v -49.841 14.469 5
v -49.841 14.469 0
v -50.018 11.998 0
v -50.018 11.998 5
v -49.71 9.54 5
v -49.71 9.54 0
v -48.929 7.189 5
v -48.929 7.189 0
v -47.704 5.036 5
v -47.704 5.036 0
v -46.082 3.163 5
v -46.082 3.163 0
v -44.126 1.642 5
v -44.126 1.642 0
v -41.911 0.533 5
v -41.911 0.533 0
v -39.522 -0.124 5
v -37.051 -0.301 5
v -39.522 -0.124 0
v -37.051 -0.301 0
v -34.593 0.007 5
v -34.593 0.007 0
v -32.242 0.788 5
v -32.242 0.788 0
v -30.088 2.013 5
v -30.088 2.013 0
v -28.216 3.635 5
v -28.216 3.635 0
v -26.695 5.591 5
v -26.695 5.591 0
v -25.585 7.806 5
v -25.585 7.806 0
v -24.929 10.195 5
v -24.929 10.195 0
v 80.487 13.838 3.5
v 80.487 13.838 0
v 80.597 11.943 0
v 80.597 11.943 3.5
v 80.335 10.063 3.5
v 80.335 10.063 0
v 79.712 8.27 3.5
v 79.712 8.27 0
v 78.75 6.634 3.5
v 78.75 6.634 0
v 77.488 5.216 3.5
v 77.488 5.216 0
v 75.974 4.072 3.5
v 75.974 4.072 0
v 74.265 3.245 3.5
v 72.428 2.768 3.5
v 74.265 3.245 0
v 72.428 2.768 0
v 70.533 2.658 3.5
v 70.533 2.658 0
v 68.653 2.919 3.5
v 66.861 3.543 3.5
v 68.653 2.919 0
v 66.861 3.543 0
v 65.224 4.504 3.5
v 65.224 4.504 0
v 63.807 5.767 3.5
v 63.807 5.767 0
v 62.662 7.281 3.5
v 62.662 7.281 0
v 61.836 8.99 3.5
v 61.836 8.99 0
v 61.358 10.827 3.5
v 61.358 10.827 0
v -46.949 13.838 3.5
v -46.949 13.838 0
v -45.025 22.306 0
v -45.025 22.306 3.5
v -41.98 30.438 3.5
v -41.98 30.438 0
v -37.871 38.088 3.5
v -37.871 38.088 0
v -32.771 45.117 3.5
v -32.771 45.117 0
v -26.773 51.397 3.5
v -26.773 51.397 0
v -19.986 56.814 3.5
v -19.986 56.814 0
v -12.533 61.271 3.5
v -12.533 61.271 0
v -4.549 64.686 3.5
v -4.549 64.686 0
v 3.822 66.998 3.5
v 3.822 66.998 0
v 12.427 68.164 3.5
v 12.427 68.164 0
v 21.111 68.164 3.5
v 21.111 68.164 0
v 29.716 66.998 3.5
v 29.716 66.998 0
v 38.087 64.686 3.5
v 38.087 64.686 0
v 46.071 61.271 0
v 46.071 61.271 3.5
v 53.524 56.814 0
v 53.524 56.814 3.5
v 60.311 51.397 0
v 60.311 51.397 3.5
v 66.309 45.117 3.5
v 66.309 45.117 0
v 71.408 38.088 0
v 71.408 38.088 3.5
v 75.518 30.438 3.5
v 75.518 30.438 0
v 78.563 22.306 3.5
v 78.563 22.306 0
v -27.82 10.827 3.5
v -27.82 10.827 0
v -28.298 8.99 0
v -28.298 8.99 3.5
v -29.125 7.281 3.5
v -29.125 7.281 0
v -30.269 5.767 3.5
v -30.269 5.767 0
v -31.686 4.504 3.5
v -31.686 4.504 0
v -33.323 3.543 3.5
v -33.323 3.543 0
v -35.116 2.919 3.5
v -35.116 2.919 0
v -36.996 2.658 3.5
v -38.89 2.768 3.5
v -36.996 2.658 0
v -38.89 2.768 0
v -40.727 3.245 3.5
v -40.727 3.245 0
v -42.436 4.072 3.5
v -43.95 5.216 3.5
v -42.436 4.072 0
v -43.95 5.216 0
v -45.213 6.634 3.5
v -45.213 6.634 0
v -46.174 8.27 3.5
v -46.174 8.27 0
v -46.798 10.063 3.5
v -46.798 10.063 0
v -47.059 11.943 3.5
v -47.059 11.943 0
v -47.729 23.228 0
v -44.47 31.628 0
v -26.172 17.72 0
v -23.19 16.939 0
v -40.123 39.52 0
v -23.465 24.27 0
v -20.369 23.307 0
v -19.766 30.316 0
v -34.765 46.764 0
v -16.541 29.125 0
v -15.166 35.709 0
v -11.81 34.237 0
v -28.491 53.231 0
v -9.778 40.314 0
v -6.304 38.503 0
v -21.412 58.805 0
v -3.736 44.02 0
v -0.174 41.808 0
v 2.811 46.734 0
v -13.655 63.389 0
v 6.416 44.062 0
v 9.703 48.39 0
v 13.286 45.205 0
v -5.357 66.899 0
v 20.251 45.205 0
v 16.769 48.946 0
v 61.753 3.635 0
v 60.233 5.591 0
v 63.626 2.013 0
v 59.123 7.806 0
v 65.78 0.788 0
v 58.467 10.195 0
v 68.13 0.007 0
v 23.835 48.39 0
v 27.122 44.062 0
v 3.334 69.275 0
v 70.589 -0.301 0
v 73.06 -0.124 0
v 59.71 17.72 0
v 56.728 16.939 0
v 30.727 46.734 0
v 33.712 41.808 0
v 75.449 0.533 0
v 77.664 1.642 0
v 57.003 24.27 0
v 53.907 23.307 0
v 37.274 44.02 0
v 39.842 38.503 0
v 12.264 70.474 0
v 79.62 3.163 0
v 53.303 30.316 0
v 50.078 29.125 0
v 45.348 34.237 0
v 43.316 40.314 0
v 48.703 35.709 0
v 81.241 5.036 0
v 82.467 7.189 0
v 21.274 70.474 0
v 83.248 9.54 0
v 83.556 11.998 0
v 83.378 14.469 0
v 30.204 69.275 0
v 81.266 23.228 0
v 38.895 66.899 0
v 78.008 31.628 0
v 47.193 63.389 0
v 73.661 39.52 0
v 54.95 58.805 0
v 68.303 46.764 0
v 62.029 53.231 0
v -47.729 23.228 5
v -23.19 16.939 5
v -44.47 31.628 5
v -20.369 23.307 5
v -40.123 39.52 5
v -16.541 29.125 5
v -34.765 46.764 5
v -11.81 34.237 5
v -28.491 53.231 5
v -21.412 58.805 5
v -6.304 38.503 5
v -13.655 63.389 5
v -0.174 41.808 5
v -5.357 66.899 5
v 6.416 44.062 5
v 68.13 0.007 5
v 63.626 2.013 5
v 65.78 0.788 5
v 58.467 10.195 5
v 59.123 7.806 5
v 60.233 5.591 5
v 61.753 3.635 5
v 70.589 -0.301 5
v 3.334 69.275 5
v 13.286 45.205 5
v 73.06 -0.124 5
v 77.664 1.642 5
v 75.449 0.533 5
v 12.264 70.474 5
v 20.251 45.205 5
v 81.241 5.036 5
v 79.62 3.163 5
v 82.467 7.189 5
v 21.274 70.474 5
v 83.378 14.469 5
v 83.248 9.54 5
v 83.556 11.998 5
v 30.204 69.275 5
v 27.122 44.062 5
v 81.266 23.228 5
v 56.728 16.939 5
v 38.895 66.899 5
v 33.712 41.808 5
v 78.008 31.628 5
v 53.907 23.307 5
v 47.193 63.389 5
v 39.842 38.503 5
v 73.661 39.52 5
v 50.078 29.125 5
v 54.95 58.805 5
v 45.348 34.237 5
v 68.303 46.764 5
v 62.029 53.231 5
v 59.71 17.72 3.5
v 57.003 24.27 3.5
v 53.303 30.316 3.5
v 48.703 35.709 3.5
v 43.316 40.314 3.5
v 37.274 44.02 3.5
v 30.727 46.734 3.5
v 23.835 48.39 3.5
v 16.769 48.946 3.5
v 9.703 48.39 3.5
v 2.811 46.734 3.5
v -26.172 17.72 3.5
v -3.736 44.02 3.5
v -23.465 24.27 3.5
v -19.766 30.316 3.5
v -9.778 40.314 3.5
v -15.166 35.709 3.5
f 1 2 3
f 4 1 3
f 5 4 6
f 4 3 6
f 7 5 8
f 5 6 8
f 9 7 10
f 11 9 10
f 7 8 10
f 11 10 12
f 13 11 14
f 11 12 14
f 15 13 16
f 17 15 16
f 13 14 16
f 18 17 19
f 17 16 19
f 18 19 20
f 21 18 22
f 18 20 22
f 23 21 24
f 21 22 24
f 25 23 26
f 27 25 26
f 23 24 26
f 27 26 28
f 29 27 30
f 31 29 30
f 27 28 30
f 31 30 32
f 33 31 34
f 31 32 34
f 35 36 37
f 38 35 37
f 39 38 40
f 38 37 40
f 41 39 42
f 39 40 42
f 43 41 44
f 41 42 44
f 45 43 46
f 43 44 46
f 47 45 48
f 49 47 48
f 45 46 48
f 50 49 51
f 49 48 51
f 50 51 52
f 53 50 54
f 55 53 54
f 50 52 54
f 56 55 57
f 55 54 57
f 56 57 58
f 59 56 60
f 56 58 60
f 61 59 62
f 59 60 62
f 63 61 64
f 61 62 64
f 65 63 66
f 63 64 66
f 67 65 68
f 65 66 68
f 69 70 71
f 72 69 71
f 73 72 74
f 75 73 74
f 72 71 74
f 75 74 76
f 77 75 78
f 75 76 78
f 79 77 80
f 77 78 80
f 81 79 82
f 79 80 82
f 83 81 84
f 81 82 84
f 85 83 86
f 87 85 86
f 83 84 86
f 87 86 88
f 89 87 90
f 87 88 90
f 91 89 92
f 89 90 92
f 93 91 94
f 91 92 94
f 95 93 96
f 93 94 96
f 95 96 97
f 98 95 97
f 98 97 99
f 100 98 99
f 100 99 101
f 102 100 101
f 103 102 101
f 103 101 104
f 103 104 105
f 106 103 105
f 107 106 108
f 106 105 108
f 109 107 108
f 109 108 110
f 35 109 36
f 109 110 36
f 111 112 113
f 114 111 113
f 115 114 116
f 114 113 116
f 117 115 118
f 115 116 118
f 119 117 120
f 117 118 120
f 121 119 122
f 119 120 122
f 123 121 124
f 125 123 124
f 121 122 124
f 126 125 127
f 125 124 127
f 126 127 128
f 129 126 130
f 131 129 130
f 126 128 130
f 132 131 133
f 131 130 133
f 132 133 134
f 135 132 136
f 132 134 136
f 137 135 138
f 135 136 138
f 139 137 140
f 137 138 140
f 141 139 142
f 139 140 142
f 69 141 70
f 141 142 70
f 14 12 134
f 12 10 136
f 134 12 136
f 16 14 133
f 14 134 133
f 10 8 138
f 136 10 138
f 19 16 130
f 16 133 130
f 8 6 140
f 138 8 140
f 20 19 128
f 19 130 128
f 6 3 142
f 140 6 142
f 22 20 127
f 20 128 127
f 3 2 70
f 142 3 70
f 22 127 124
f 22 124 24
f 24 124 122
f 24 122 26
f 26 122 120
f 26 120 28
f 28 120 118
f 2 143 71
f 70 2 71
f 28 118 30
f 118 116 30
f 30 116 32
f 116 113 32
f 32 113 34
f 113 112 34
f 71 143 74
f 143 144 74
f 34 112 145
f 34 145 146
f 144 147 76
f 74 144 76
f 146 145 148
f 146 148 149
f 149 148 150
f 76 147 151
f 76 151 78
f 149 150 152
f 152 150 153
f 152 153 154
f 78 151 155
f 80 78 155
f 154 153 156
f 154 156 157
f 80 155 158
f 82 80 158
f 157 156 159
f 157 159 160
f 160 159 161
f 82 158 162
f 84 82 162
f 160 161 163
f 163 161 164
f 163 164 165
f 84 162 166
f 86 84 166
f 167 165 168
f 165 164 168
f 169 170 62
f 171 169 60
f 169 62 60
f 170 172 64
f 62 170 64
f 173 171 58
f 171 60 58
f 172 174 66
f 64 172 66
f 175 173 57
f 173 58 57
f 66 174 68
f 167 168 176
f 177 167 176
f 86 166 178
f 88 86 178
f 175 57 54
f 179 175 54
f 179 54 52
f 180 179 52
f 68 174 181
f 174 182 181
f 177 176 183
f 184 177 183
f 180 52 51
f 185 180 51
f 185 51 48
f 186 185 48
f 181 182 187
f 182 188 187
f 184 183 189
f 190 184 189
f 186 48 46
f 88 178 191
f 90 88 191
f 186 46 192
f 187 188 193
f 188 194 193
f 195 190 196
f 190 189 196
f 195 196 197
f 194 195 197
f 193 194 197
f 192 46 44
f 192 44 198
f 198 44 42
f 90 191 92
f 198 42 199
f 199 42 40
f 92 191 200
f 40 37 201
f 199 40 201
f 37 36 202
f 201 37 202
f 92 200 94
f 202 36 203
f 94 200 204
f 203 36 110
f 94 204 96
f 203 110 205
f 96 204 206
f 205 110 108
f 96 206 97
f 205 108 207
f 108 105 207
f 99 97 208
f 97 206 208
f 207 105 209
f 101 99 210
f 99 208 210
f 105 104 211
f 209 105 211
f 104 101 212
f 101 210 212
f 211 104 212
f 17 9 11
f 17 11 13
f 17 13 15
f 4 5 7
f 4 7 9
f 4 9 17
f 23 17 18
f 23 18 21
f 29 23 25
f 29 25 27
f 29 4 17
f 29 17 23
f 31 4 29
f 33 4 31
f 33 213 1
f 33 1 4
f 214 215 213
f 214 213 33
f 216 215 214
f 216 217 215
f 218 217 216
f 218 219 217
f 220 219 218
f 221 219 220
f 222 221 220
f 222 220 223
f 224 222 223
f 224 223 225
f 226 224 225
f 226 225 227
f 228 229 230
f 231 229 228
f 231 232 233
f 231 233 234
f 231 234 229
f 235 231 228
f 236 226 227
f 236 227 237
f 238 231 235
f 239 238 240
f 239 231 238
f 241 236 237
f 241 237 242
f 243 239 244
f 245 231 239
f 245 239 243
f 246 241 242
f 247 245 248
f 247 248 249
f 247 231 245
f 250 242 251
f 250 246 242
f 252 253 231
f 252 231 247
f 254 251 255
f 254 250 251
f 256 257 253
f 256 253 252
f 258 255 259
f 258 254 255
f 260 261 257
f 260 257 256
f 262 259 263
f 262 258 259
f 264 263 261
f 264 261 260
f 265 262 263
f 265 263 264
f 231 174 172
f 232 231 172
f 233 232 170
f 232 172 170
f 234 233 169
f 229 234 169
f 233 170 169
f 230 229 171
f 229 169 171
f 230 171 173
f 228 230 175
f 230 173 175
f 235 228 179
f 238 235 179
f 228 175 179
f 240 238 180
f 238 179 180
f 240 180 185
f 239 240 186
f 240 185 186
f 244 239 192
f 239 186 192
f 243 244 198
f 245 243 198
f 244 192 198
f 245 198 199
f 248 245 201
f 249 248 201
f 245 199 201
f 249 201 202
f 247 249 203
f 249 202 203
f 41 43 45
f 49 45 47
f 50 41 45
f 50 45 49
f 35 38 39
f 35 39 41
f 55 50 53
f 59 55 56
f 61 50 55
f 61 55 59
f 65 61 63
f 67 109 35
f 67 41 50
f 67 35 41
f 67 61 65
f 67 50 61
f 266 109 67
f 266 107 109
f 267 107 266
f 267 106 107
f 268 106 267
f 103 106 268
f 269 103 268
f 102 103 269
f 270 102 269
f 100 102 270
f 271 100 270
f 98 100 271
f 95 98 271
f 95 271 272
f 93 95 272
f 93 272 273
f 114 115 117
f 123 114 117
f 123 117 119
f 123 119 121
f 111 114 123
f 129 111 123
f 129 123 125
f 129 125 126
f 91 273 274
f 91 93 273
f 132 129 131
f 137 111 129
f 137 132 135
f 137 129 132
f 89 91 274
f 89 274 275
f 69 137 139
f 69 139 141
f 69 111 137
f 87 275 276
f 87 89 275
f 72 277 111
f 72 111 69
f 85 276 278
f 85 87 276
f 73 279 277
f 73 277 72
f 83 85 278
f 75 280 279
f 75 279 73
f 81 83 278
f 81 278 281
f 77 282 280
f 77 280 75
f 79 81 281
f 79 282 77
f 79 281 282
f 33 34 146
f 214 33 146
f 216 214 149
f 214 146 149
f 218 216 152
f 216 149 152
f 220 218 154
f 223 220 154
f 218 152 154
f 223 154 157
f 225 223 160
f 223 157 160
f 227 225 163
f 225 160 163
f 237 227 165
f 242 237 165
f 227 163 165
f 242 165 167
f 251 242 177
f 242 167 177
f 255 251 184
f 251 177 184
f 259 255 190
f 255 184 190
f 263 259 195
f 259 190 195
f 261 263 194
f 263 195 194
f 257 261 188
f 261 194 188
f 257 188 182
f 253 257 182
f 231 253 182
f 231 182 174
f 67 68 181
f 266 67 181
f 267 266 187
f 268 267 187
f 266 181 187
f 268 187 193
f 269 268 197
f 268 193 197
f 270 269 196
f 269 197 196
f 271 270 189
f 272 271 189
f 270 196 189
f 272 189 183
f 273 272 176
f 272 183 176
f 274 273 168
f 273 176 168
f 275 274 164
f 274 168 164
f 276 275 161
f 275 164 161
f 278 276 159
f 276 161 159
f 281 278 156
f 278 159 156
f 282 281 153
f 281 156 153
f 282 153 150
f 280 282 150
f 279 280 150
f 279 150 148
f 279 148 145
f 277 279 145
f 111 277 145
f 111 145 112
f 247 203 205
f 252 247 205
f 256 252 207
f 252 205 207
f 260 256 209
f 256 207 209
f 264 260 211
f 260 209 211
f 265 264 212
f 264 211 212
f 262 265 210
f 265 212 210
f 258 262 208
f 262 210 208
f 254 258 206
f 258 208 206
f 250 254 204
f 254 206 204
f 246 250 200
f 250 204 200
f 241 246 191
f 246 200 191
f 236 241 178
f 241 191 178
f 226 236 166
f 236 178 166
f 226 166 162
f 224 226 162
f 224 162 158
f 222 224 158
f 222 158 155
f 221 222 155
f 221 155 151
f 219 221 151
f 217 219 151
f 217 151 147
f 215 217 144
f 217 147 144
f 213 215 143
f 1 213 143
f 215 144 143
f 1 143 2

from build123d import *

# Parameters (mm, degrees)
BOSS_EXTRUDE1_DEPTH = 5
CUT_EXTRUDE1_DEPTH  = 3.5


with BuildPart() as part:
    # Sketch1 → Boss-Extrude1 (new body)
    with BuildSketch(Plane.XY):
        with BuildLine():
            ThreePointArc((83.37845056, 14.469012335), (16.768892688, 70.623970918), (-49.840665185, 14.469012335))
            ThreePointArc((-49.840665185, 14.469012335), (-39.521894243, -0.123659797), (-24.929222112, 10.195111145))
            ThreePointArc((-24.929222112, 10.195111145), (16.768892688, 45.348563357), (58.467007487, 10.195111145))
            ThreePointArc((58.467007487, 10.195111145), (73.059679618, -0.123659797), (83.37845056, 14.469012335))
        make_face()
    extrude(amount=BOSS_EXTRUDE1_DEPTH)

    # Sketch2 → Cut-Extrude1 (cut)
    with BuildSketch(Plane(origin=(0, 0, 0), x_dir=(-1, 0, 0), z_dir=(0, 0, -1))):
        with BuildLine():
            ThreePointArc((46.94943865, 13.837591132), (-16.768892688, 68.310693084), (-80.487224025, 13.837591132))
            ThreePointArc((-80.487224025, 13.837591132), (-72.428258415, 2.767566738), (-61.358234021, 10.826532348))
            ThreePointArc((-61.358234021, 10.826532348), (-16.768892688, 48.946170535), (27.820448646, 10.826532348))
            ThreePointArc((27.820448646, 10.826532348), (38.89047304, 2.767566738), (46.94943865, 13.837591132))
        make_face()
    extrude(amount=-CUT_EXTRUDE1_DEPTH, mode=Mode.SUBTRACT)


solid = part.part
